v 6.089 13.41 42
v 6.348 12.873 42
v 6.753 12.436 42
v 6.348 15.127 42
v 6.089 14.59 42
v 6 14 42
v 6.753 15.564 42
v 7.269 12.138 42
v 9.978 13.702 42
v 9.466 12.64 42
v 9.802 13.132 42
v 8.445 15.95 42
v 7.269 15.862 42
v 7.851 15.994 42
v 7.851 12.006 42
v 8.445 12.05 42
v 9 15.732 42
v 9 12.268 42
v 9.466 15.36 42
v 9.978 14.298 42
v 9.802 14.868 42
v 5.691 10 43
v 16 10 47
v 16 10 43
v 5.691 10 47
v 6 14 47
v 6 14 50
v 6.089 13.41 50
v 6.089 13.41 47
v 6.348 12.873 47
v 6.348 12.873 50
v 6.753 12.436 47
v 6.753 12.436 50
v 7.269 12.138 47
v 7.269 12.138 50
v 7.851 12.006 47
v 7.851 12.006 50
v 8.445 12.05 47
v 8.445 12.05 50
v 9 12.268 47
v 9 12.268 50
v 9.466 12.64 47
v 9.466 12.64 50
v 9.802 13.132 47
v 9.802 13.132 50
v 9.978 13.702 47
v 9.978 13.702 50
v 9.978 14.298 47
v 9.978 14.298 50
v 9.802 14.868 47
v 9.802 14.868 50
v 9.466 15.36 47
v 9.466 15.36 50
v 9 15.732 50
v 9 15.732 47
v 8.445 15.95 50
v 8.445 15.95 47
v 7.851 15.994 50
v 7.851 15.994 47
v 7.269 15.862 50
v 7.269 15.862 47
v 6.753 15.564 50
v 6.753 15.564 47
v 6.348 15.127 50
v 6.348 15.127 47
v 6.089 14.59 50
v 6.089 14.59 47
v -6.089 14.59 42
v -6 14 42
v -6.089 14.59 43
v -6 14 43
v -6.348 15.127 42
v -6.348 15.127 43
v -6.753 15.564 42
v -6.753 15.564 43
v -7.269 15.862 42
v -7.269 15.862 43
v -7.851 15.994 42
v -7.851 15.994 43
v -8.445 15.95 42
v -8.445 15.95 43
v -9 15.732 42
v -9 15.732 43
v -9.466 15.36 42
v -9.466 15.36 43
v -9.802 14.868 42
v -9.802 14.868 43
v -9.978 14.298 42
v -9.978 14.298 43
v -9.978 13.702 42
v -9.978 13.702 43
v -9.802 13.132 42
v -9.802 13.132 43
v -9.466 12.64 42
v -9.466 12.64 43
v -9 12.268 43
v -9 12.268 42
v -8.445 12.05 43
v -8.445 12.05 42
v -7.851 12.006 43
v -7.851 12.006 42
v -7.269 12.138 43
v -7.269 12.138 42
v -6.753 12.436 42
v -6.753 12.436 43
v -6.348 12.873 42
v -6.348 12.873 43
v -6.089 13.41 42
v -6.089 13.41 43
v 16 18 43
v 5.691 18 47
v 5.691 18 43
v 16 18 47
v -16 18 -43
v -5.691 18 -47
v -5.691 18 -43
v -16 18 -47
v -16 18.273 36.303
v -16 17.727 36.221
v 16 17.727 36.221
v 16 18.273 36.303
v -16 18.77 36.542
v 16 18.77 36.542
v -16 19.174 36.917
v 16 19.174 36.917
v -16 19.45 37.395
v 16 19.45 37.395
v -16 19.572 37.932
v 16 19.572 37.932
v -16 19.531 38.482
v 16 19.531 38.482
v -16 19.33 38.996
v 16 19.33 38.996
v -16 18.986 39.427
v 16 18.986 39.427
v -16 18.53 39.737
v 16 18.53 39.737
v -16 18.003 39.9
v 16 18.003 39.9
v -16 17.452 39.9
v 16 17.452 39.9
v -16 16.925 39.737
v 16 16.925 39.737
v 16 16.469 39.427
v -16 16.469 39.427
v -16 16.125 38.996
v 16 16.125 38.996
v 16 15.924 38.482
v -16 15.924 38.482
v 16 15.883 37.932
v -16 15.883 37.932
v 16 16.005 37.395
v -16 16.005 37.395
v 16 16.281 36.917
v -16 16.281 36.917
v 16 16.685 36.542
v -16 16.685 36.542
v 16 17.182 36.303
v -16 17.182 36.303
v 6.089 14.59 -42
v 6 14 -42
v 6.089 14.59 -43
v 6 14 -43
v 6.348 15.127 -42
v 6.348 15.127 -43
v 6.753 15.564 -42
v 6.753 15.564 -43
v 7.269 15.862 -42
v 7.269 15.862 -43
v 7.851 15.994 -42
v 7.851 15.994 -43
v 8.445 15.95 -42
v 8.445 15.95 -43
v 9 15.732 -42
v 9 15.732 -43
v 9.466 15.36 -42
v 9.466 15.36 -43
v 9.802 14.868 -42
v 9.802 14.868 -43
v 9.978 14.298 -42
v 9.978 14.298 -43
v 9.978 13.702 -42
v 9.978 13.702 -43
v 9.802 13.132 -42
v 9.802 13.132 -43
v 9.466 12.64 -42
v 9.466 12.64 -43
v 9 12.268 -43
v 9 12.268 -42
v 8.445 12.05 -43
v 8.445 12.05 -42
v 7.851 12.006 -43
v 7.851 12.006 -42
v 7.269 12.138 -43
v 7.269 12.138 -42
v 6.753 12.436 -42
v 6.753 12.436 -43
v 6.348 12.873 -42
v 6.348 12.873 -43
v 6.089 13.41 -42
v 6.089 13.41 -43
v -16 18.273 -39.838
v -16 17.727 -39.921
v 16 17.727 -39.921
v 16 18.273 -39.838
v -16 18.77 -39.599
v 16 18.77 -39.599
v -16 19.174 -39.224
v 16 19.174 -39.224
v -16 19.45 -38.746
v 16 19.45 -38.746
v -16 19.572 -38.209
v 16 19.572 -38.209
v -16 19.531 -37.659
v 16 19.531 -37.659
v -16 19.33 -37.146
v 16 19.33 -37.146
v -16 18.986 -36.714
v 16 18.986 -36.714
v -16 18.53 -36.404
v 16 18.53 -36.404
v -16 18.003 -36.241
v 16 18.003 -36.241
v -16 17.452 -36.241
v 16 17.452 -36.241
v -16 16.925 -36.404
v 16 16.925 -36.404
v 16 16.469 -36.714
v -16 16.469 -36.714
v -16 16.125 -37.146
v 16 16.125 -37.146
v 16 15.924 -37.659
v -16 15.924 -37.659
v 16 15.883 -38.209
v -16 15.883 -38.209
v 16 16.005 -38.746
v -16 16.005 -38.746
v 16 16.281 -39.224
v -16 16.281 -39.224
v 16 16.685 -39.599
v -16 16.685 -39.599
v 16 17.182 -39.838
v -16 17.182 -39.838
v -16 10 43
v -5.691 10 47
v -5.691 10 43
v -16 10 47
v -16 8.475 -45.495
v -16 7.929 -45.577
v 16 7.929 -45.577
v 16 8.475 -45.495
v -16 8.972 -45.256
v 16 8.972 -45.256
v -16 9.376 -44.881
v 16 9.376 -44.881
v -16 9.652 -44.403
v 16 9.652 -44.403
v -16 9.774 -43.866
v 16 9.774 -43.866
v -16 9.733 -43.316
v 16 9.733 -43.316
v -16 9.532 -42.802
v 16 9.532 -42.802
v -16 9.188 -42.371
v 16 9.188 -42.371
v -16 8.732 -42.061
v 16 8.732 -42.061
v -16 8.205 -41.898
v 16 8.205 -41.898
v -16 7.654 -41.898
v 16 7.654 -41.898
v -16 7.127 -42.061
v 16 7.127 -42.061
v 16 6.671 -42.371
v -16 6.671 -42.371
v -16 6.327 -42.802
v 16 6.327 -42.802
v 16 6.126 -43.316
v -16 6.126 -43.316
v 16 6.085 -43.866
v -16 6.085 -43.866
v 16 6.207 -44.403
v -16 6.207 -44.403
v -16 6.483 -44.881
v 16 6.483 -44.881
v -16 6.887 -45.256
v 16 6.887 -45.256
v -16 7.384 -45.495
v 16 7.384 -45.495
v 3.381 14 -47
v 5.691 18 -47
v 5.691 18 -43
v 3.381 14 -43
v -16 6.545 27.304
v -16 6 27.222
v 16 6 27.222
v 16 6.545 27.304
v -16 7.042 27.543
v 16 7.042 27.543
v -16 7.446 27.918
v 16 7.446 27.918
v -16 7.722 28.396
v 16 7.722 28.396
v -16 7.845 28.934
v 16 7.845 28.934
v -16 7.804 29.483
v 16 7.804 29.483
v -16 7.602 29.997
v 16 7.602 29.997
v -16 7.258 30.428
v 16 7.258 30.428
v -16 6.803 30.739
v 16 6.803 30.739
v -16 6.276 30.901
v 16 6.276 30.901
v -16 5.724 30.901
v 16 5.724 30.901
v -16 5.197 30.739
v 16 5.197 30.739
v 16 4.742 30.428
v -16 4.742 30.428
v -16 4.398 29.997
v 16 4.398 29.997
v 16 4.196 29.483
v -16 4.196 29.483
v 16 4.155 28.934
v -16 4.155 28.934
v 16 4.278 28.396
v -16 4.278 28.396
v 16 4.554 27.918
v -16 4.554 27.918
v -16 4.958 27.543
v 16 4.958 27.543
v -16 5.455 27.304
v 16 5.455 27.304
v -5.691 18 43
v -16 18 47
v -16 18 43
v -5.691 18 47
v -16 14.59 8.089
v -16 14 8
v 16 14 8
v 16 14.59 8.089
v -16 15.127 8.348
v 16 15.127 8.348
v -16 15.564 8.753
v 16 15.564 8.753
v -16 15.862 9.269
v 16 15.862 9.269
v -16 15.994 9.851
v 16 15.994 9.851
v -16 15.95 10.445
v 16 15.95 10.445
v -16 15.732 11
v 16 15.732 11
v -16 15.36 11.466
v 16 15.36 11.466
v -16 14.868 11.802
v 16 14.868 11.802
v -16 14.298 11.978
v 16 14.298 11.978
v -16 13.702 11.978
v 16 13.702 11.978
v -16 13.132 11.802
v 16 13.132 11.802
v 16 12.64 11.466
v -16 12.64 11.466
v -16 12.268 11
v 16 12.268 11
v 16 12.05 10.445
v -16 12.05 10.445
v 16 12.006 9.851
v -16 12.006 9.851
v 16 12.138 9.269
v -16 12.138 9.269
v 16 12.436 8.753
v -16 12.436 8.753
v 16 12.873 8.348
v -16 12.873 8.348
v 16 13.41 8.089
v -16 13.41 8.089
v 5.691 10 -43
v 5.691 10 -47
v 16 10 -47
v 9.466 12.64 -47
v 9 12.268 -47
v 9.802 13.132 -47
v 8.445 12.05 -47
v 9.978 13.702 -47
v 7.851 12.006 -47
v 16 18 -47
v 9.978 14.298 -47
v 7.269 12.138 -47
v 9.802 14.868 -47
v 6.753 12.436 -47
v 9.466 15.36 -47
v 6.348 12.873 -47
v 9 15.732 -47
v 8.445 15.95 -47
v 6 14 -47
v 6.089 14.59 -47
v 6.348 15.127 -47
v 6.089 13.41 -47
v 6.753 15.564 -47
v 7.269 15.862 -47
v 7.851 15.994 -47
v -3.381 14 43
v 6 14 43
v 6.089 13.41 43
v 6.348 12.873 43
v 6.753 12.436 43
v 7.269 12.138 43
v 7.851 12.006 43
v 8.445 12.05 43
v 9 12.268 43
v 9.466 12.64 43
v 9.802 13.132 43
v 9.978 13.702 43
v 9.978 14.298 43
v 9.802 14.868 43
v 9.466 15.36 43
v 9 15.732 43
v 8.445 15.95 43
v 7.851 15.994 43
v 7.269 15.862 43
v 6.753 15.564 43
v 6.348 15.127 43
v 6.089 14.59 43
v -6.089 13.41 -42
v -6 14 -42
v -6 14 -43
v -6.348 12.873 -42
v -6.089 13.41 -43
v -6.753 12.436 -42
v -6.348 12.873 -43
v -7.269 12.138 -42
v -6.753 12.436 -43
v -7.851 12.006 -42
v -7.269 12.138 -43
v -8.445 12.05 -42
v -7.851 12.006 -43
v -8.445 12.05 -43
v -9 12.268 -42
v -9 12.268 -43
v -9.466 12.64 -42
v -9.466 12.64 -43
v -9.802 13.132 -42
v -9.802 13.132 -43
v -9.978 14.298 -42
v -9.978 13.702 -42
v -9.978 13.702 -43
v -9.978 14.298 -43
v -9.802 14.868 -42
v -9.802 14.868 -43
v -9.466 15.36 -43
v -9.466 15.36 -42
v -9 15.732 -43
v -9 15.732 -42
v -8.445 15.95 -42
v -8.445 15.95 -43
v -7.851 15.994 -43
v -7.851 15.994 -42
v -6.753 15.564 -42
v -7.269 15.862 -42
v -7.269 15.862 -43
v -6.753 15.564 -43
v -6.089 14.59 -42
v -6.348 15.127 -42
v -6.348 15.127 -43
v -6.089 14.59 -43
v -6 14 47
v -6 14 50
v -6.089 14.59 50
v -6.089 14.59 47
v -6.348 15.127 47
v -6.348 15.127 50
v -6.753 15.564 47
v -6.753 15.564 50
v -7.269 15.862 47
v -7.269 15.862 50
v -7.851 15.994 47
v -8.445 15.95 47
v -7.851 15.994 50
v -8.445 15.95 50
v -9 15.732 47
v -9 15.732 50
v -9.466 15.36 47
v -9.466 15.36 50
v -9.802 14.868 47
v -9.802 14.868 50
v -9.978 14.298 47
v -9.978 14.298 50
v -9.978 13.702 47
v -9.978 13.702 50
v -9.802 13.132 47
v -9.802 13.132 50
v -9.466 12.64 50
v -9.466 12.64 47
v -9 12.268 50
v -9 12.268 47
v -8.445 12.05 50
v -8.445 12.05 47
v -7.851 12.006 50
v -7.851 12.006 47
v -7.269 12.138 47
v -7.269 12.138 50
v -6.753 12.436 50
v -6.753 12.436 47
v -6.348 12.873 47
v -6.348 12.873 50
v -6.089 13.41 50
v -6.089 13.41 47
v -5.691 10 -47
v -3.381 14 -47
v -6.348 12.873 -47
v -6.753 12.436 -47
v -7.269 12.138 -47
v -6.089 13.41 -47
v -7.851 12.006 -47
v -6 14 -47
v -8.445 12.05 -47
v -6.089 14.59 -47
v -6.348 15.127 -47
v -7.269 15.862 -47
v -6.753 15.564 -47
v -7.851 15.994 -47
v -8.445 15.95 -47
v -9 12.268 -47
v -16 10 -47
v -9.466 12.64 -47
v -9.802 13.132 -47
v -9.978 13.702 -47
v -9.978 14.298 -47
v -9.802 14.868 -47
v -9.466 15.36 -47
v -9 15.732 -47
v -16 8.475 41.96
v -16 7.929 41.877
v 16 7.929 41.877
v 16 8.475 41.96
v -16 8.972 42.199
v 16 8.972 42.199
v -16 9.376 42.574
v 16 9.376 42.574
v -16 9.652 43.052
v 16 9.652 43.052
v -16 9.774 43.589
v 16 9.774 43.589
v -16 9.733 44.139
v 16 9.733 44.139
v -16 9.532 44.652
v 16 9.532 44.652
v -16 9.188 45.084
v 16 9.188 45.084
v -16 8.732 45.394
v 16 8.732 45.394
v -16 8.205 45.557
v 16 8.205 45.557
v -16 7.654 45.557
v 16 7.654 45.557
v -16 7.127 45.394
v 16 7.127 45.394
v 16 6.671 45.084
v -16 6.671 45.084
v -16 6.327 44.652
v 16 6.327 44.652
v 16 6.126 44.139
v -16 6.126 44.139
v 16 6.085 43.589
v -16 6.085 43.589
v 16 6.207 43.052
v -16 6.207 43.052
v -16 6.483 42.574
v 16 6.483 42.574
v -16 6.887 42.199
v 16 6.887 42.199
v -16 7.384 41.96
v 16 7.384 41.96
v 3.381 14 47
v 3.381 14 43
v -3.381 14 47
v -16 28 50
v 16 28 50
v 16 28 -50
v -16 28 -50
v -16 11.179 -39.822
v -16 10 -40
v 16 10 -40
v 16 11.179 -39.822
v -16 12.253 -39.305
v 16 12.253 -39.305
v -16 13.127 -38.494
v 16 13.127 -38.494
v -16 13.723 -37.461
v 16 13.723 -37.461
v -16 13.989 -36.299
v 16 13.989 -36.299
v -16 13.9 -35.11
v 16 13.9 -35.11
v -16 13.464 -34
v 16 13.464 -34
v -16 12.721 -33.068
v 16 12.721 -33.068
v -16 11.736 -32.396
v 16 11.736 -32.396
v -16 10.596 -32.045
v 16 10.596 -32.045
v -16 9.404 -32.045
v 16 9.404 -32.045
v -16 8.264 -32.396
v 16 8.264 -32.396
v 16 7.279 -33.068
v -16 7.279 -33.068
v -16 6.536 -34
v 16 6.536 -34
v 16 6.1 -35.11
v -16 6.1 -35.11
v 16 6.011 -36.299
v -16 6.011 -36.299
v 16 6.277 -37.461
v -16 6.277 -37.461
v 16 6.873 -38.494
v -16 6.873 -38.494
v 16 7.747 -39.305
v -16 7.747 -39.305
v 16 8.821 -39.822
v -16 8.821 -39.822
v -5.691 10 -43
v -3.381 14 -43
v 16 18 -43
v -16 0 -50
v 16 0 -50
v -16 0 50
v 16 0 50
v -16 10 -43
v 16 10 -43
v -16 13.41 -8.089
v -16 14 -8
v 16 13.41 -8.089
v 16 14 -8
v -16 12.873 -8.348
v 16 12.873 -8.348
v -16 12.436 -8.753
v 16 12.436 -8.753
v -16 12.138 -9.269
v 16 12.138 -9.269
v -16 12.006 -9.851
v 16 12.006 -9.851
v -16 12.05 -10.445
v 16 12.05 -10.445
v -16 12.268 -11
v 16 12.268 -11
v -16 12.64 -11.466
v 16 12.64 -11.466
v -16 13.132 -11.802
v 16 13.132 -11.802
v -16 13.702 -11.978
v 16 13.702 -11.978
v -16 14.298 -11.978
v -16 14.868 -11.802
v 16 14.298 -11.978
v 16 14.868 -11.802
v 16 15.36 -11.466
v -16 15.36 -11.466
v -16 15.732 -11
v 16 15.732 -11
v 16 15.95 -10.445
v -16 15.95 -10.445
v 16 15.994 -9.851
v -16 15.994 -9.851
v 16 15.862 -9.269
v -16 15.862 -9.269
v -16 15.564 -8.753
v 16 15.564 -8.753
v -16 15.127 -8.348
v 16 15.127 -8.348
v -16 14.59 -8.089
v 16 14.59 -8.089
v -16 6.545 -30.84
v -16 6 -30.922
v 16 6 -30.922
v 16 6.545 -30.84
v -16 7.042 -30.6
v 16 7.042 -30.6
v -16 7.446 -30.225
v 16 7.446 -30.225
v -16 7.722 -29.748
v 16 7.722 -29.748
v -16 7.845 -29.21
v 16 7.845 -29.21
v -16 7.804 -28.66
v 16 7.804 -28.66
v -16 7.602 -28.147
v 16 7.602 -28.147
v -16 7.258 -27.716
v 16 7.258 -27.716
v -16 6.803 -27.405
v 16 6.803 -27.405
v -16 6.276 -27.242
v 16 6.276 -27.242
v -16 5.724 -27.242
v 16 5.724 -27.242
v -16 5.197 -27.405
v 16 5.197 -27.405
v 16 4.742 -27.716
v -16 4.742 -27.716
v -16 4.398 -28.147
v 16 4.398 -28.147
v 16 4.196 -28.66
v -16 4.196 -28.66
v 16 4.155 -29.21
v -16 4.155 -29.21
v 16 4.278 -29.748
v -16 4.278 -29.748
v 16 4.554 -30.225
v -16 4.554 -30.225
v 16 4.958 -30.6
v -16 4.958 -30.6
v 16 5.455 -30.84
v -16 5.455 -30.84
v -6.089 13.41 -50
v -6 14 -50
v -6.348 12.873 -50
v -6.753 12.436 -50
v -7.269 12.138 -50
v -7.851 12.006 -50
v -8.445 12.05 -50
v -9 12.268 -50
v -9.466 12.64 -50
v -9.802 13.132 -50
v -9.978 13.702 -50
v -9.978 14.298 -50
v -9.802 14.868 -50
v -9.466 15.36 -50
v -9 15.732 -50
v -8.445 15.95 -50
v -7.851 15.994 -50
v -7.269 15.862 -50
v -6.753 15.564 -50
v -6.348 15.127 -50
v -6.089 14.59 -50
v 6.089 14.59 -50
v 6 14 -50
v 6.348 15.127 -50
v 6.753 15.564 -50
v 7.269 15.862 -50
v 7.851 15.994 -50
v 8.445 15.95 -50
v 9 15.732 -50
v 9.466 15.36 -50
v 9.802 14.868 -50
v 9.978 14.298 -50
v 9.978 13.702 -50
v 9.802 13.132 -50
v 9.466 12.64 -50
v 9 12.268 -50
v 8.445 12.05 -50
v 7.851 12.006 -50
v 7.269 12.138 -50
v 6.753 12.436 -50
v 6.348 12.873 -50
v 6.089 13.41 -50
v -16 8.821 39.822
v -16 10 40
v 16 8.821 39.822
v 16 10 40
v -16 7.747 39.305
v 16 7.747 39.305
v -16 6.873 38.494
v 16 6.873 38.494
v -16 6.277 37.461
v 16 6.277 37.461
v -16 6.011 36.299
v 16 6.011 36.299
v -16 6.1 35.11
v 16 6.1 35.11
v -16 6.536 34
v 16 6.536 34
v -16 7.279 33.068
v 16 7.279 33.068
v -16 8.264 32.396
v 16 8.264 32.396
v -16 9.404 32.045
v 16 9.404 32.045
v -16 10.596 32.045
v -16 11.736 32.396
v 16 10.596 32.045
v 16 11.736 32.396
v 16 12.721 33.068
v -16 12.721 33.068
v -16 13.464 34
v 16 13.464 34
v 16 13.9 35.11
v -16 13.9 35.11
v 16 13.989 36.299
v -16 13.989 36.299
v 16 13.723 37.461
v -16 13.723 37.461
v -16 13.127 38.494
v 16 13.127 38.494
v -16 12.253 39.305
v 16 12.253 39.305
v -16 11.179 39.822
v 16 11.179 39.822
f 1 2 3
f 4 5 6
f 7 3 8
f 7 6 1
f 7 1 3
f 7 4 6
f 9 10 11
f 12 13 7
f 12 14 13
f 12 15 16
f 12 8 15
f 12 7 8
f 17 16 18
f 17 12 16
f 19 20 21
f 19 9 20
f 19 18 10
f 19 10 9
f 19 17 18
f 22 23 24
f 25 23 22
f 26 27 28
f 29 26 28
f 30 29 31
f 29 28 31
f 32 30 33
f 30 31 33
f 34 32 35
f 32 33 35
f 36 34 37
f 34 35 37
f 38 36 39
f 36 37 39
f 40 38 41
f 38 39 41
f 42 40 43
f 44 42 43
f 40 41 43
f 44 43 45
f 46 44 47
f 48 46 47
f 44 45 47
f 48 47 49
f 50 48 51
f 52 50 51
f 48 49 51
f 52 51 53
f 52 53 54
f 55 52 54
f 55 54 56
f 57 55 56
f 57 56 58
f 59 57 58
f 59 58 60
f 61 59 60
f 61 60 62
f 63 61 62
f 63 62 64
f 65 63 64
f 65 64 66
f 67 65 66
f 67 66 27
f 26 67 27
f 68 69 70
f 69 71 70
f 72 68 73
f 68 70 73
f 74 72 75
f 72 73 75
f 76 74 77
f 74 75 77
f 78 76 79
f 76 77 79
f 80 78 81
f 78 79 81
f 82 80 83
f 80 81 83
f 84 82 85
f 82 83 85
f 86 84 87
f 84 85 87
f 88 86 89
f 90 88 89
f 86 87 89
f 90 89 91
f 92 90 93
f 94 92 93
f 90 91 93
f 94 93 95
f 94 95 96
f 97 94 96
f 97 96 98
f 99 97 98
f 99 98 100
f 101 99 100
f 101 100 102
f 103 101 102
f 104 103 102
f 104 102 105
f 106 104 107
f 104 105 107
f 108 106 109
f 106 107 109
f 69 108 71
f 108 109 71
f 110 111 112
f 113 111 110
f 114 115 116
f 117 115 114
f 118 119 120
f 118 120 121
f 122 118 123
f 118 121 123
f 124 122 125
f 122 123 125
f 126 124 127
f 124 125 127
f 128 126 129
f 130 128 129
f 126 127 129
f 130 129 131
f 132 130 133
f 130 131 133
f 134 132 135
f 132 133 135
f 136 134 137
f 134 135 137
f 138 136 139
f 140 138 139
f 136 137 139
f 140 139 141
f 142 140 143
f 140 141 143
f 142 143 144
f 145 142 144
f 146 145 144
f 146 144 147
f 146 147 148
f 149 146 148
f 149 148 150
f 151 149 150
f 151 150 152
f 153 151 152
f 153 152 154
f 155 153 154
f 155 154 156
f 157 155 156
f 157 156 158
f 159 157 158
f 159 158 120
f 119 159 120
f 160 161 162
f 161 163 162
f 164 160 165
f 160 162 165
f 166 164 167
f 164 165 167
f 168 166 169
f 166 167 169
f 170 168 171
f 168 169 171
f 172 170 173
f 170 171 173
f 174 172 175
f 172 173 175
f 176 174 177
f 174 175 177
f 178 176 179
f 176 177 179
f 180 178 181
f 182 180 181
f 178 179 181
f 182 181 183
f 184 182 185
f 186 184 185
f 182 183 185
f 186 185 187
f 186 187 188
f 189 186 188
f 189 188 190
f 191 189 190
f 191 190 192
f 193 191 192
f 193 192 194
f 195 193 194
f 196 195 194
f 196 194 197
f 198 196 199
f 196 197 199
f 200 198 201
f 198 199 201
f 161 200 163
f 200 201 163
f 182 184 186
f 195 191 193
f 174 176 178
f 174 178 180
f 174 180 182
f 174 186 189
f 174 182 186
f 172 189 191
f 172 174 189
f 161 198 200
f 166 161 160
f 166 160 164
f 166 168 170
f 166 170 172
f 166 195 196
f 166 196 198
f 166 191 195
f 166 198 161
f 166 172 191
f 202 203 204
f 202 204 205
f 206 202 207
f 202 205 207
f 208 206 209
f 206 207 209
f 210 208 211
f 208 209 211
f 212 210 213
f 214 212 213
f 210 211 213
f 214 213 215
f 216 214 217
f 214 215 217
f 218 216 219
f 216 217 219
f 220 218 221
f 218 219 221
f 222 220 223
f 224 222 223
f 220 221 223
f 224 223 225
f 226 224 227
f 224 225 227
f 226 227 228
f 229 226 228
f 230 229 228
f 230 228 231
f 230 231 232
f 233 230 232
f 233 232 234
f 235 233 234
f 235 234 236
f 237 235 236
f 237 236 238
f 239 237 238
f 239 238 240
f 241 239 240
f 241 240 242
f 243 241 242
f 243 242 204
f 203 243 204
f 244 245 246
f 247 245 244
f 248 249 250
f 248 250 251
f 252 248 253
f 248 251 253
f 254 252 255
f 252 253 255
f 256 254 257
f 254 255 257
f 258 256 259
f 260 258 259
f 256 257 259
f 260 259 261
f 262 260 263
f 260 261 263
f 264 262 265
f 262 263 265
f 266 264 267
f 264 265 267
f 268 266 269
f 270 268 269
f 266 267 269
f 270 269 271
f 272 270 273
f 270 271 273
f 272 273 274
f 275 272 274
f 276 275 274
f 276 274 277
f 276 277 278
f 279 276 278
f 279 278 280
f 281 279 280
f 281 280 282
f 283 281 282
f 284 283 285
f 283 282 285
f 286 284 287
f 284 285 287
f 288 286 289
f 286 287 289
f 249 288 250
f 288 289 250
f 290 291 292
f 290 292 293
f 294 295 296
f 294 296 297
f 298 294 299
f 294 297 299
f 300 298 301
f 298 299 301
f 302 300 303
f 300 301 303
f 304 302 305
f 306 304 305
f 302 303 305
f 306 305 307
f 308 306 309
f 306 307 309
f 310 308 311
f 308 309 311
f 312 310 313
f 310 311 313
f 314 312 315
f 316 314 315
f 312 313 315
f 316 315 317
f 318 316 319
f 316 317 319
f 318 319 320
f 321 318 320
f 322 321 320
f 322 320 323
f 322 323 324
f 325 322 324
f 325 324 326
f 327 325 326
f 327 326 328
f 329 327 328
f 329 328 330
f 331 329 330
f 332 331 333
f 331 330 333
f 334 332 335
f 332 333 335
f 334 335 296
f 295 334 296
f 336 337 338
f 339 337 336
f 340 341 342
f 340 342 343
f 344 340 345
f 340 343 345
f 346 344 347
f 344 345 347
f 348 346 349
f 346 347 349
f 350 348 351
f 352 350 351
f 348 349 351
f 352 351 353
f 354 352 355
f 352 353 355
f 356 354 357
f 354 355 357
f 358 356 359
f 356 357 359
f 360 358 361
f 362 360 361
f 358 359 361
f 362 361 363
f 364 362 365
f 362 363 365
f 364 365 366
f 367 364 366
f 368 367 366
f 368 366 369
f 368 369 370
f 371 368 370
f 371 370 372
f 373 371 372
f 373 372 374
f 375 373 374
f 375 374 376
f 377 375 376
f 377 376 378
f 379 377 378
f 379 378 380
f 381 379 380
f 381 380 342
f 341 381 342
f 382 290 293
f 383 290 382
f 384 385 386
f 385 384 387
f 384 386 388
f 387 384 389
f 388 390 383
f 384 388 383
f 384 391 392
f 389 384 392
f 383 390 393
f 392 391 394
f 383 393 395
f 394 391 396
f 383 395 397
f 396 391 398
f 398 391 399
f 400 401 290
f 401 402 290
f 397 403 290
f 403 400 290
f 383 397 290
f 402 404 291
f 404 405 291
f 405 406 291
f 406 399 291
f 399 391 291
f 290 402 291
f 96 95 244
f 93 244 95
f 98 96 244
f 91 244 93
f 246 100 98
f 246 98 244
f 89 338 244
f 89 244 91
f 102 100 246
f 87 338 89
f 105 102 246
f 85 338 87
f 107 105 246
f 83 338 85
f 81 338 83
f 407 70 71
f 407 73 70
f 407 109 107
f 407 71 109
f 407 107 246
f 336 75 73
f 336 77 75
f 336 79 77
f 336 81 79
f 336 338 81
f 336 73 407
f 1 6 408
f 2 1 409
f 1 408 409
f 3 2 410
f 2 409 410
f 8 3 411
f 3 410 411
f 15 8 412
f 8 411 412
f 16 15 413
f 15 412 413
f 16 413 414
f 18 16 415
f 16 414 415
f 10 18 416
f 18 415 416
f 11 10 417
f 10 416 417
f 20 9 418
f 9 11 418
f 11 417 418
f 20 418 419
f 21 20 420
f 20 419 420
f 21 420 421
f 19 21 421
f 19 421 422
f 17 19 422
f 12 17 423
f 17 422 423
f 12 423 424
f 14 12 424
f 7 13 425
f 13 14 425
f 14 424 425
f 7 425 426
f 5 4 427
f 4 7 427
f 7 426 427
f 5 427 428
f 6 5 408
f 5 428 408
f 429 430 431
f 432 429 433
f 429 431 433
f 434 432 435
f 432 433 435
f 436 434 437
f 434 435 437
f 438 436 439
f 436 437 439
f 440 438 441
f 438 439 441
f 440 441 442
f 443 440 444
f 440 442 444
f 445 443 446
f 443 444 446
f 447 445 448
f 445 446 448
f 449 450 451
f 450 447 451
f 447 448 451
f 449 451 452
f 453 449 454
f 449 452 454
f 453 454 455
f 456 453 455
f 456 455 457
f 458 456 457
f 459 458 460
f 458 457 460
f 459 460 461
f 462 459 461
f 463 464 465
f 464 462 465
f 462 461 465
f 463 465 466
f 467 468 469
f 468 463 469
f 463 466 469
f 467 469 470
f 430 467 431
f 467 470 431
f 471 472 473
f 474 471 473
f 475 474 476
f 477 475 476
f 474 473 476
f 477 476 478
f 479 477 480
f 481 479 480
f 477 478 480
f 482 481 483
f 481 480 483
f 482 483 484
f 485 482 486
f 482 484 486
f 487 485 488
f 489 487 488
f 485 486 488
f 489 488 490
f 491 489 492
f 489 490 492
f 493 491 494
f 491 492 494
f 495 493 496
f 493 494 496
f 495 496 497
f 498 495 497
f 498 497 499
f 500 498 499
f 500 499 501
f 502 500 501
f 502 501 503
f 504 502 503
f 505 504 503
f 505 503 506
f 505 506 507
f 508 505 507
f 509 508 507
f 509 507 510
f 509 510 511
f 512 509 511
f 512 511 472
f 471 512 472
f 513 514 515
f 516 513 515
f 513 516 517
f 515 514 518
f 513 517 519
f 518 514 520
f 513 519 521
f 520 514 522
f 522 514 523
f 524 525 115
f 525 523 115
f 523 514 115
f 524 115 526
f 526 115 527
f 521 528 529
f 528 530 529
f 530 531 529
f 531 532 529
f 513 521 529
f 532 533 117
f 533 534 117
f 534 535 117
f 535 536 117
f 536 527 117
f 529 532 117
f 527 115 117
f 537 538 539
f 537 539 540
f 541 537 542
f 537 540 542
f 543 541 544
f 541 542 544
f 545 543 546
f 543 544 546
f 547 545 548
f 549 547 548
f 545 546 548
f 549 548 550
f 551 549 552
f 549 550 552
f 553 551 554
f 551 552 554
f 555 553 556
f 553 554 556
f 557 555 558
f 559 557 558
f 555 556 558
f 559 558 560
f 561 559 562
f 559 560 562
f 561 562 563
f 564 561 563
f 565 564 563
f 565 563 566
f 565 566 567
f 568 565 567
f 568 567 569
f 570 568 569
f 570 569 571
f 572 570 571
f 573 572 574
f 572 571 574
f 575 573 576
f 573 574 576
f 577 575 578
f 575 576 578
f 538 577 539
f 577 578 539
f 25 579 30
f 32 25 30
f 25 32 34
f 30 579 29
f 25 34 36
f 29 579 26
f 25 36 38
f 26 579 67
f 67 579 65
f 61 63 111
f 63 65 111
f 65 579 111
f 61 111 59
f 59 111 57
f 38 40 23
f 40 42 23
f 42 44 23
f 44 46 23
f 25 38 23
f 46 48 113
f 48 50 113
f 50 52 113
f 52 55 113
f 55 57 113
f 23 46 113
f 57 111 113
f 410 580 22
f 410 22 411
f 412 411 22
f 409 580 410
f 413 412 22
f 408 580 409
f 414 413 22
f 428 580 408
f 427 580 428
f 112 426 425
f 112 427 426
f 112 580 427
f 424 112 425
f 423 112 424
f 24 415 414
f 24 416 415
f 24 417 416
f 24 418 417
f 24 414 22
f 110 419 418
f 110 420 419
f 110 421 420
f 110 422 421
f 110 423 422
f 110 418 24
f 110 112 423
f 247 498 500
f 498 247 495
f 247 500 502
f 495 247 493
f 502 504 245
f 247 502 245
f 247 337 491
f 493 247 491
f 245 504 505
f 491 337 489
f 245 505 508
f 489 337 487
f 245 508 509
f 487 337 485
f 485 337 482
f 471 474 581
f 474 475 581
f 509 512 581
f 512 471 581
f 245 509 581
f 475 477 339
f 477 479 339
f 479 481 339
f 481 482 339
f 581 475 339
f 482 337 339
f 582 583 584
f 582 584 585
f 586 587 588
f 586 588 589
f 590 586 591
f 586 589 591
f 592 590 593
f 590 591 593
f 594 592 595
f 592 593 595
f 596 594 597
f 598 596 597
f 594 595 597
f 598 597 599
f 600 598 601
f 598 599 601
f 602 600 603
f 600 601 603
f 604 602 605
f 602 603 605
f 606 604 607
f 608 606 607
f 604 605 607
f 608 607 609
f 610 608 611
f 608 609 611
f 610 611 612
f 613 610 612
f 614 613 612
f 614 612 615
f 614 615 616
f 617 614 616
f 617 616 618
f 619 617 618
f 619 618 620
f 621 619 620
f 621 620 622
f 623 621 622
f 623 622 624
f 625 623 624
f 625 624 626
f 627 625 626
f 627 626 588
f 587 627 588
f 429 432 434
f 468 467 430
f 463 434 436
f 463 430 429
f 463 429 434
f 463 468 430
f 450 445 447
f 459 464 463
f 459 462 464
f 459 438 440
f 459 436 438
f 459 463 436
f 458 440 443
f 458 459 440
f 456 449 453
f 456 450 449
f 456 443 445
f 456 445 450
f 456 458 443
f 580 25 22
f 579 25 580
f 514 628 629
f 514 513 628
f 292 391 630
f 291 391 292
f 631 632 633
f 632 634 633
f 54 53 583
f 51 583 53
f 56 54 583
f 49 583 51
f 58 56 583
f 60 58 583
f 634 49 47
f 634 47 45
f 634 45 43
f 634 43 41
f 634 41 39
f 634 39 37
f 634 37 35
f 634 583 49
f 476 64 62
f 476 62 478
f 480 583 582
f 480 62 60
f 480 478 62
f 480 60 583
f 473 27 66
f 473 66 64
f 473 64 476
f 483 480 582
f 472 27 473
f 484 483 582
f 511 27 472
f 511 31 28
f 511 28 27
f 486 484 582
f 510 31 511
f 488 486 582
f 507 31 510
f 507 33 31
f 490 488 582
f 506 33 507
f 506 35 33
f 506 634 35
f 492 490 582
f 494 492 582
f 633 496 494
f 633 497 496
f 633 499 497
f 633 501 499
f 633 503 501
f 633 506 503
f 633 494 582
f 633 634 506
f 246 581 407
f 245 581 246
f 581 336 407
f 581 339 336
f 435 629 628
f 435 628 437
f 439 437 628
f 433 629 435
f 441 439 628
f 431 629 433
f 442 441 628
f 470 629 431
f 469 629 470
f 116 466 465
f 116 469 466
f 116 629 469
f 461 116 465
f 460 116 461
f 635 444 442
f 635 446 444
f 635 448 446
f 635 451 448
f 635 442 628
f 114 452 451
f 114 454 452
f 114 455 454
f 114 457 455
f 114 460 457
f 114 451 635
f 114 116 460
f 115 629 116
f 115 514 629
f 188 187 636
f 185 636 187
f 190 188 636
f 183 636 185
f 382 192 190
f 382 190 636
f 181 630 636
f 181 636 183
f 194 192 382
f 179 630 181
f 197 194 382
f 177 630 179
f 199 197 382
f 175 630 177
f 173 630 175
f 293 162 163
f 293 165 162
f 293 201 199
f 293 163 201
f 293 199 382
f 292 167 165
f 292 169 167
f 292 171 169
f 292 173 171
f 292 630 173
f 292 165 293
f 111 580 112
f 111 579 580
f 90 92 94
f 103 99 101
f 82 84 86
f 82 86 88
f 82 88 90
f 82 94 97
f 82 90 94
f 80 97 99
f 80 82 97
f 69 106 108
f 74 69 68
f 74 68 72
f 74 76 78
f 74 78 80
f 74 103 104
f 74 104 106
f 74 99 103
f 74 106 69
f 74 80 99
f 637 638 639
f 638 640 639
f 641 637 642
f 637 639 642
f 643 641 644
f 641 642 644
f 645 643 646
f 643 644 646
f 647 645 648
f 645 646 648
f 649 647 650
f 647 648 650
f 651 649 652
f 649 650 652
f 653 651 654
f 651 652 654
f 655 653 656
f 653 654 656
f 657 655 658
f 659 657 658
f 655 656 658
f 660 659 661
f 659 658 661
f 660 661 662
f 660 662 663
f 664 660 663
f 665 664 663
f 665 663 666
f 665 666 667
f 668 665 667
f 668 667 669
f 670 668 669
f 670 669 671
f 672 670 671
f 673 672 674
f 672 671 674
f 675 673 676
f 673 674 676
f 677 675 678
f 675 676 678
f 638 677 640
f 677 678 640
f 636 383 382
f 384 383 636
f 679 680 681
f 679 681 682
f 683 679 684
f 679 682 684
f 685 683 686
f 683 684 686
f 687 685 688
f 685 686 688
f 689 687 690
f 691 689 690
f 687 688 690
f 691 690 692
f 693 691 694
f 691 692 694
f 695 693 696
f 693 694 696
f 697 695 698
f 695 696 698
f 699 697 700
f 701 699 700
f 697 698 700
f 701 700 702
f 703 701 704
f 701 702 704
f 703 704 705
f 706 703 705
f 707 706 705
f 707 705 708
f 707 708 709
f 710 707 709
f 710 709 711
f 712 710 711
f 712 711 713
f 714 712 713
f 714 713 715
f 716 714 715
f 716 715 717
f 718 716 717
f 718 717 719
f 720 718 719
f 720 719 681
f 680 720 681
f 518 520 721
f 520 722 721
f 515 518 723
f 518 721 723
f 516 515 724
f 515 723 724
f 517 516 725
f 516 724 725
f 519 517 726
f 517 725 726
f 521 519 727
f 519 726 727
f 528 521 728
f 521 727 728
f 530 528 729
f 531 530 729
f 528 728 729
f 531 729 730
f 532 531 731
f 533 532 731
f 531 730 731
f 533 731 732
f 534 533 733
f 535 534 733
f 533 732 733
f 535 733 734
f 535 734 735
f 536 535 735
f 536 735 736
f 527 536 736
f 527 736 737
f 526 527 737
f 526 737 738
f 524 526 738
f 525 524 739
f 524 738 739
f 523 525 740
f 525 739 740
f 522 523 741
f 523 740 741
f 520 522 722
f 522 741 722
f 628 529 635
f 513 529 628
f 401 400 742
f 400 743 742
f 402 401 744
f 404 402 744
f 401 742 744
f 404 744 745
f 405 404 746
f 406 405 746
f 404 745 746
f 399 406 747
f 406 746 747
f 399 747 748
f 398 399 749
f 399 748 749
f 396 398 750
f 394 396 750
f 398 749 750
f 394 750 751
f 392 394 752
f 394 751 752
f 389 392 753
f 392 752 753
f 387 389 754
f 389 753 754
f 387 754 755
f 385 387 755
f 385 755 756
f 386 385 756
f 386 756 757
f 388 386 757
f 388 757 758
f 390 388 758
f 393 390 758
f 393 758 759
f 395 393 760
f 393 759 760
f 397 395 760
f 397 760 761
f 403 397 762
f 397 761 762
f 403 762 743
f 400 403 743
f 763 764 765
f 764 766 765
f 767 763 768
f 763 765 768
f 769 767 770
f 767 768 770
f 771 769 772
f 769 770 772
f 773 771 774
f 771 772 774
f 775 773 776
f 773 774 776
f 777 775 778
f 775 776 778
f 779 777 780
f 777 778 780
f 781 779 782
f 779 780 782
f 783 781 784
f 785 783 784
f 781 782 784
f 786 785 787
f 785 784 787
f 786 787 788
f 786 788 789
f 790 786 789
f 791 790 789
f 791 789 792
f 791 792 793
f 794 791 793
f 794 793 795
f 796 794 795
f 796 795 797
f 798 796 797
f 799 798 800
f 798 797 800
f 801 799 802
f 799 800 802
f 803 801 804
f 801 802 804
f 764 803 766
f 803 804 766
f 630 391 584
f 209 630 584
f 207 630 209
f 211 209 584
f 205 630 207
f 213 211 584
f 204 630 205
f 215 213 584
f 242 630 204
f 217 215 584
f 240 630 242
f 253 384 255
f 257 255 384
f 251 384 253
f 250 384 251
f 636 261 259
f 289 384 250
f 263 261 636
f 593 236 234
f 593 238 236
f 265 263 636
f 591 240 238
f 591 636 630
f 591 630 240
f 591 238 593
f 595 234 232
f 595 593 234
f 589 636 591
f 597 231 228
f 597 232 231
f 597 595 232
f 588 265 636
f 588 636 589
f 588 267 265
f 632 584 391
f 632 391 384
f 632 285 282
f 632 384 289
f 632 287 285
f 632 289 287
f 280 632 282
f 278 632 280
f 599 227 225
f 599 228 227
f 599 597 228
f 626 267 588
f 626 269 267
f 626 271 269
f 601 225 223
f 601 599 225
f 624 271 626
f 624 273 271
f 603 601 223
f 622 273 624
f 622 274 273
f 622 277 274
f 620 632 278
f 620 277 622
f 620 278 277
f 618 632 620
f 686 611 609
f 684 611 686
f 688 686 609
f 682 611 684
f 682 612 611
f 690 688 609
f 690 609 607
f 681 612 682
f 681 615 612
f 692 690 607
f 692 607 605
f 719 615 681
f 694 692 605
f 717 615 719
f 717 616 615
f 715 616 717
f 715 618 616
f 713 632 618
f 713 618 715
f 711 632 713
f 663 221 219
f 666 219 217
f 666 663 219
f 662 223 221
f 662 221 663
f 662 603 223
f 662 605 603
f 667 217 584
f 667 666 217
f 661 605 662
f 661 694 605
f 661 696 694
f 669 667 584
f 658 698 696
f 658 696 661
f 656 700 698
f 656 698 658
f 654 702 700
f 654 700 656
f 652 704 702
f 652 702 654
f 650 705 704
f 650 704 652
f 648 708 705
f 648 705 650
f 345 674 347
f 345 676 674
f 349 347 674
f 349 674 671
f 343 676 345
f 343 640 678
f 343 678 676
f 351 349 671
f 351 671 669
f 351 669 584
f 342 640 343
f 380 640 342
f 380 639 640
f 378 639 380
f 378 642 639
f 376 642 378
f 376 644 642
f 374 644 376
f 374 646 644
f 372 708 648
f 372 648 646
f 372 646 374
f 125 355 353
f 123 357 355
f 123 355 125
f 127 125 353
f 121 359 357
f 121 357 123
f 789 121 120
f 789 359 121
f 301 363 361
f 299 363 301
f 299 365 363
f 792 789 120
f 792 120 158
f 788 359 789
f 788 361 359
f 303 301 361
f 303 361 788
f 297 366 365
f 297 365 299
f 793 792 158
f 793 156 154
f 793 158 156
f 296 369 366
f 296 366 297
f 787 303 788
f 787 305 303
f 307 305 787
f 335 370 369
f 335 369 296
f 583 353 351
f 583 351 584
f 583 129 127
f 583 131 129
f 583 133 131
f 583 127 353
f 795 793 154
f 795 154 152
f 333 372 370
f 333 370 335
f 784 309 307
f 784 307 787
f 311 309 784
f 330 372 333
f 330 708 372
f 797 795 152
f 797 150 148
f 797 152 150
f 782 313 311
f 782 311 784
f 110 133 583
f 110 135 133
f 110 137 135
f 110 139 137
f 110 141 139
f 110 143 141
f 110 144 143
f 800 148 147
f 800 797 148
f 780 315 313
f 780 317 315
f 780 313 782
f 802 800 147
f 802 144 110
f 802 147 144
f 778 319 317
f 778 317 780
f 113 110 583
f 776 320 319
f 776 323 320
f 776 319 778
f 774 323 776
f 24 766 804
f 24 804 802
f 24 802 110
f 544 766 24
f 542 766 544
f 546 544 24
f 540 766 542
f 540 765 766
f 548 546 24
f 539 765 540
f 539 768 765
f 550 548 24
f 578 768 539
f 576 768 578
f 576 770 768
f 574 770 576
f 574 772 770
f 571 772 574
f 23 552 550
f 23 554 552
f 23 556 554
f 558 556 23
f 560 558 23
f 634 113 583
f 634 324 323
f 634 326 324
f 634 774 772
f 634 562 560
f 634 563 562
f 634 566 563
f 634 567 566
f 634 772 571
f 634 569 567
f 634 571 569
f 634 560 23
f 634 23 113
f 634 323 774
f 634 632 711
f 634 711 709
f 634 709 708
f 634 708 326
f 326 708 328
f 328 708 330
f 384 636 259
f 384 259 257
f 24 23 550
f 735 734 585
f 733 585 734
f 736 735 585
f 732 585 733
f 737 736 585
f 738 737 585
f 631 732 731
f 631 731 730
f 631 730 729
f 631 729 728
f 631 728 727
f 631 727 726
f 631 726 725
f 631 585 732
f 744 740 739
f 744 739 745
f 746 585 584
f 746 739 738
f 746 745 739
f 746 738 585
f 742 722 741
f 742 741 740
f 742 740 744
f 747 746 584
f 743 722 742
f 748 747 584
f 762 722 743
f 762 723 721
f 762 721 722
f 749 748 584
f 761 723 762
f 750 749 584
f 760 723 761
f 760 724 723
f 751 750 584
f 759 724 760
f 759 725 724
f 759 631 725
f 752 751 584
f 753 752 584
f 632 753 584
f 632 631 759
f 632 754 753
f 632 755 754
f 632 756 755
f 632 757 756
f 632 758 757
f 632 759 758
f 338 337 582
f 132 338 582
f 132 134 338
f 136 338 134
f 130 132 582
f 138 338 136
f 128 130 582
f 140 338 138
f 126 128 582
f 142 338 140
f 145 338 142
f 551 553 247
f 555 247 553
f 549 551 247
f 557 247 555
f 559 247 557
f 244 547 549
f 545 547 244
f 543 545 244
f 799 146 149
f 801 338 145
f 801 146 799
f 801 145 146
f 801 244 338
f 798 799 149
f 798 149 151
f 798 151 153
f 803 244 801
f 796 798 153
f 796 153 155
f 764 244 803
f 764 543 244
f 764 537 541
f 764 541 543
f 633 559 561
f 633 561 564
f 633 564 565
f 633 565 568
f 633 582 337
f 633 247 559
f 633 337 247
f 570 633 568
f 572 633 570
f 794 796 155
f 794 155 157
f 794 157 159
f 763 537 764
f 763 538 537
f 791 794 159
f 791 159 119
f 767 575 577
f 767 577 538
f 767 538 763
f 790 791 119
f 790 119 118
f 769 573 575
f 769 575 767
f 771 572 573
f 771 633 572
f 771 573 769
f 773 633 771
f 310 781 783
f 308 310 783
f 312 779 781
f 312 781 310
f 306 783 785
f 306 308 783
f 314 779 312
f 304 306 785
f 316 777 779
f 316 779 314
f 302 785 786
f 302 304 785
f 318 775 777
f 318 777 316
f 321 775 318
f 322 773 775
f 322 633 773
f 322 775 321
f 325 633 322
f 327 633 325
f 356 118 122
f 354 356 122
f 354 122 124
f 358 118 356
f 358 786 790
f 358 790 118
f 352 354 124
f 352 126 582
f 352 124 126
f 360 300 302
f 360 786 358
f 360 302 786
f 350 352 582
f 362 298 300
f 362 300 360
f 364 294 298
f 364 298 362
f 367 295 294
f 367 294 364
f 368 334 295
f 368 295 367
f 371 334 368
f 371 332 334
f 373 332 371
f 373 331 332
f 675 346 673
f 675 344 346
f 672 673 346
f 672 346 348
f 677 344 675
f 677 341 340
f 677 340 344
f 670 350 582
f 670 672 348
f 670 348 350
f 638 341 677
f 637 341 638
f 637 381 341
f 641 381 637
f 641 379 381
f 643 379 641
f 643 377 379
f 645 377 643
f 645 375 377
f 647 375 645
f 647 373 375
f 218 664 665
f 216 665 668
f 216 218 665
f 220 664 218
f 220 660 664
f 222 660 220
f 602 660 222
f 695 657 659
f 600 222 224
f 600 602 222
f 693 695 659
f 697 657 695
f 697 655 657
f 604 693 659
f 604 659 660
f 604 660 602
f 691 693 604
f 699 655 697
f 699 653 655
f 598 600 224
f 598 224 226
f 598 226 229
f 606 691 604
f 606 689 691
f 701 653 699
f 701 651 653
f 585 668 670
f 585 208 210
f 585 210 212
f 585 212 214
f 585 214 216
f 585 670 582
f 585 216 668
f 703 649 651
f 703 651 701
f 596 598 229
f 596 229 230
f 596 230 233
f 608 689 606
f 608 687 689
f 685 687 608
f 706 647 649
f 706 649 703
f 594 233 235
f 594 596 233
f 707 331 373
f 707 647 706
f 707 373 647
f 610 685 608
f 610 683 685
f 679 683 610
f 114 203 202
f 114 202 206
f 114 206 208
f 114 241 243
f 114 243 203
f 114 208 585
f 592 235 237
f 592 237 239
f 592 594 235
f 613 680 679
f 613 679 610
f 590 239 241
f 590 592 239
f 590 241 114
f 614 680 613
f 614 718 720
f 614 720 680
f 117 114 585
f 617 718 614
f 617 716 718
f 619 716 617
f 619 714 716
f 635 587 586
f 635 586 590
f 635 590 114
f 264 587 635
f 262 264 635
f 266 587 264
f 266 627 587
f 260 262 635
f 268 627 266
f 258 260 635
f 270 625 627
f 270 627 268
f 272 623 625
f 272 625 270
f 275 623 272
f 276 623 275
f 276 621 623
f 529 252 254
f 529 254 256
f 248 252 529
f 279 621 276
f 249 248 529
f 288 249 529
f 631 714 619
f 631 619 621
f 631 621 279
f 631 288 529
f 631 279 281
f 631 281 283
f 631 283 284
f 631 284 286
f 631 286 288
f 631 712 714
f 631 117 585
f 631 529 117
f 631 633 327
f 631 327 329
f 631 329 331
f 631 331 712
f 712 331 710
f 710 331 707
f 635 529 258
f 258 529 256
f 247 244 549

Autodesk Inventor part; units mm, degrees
ref_plane "YZ Plane" through (0, 0, 0) normal (1, 0, 0) x (0, 1, 0)
ref_plane "XZ Plane" through (0, 0, 0) normal (0, 1, 0) x (-1, 0, 0)
sketch "Эскиз1" plane through (0, 0, 0) normal (0, 1, 0) x (-1, 0, 0)
  line L0 (-16, 50) -> (16, 50)
  line L1 (16, 50) -> (16, -50)
  line L2 (16, -50) -> (-16, -50)
  line L3 (-16, -50) -> (-16, 50)
  line L4 (-16, 50) -> (16, -50) construction
  line L5 (16, 50) -> (-16, -50) construction
  point P0 (0, 0)
  dimension "d0" = 32
  dimension "d1" = 100
extrude "Выдавливание1" add sketch "Эскиз1" along normal blind 28
sketch "Эскиз2" plane through (16, 0, 50) normal (1, 0, 0) x (0, 0, -1)
  circle A0 centre (86, 10) radius 4
  line L0 (100, 0) -> (100, 28) projected
  line L1 (0, 0) -> (100, 0) projected
  point P0 (50, 0)
  dimension "d4" = 8
  dimension "d5" = 14
  dimension "d6" = 10
extrude "Выдавливание2" cut sketch "Эскиз2" against normal through all
mirror "Зеркальное отражение1" about plane through (0, 0, 0) normal (0, 0, 1) of "Выдавливание2"
sketch "Эскиз3" plane through (16, 0, 50) normal (1, 0, 0) x (0, 0, -1)
  circle A0 centre (11.9294, 17.7274) radius 1.85 projected
  circle A1 centre (20.9282, 6) radius 1.85 projected
  circle A2 centre (79.0718, 6) radius 1.85 projected
  circle A3 centre (88.0706, 17.7274) radius 1.85 projected
  circle A4 centre (93.7274, 7.9294) radius 1.85 projected
  circle A5 centre (6.2726, 7.9294) radius 1.85 projected
  point P0 (50, 0)
extrude "Выдавливание3" cut sketch "Эскиз3" against normal through all
sketch "Эскиз4" plane through (16, 0, 50) normal (1, 0, 0) x (0, 0, -1)
  line L0 (50, 0) -> (50, 14) construction
  line L1 (50, 14) -> (40, 14) construction
  circle A0 centre (40, 14) radius 2
  dimension "d11" = 10
  dimension "d12" = 14
  dimension "d13" = 4
extrude "Выдавливание4" cut sketch "Эскиз4" against normal through all
mirror "Зеркальное отражение2" about plane through (0, 0, 0) normal (0, 0, 1) of "Выдавливание4"
sketch "Эскиз5" plane through (-16, 0, 50) normal (0, 0, 1) x (1, 0, 0)
  circle A0 centre (8, 14) radius 2
  line L0 (0, 0) -> (32, 0) projected
  line L1 (0, 0) -> (0, 28) projected
  point P0 (16, 0)
  dimension "d16" = 4
  dimension "d17" = 14
  dimension "d18" = 8
extrude "Выдавливание5" cut sketch "Эскиз5" against normal blind 8
ref_plane "РабПлоскость1" through (-16, 0, 47) normal (0, 0, 1) x (1, 0, 0)
sketch "Эскиз6" plane through (-16, 0, 47) normal (0, 0, 1) x (1, 0, 0)
  circle A0 centre (8, 14) radius 2 projected
  line L0 (10.3094, 10) -> (5.6906, 10)
  line L1 (5.6906, 10) -> (3.3812, 14)
  line L2 (3.3812, 14) -> (5.6906, 18)
  line L3 (5.6906, 18) -> (10.3094, 18)
  line L4 (10.3094, 18) -> (12.6188, 14)
  line L5 (12.6188, 14) -> (10.3094, 10)
  line L6 (32, 0) -> (0, 0) projected
  line L7 (5.6906, 18) -> (0, 18)
  line L8 (32, 19.5774) -> (0, 19.5774) projected
  line L9 (5.6906, 10) -> (0, 10)
  line L10 (0, 6) -> (0, 14) projected
  line L11 (0, 18) -> (0, 10)
  point P0 (16, 0)
  point P1 (0, 14)
  dimension "d22" = 8
extrude "Выдавливание6" cut sketch "Эскиз6" against normal blind 4 contours A0 | L0 L1 L2 L3 L4 L5 | L9 L10 L11 L7 L2 L1
ref_plane "РабПлоскость2" through (0, 28, 50) normal (-1, 0, 0) x (0, 0, 1)
mirror "Зеркальное отражение3" about plane through (0, 28, 50) normal (-1, 0, 0) of "Выдавливание6", "Выдавливание5"
mirror "Зеркальное отражение4" about plane through (0, 0, 0) normal (0, 0, 1) of "Выдавливание6", "Выдавливание5", "Зеркальное отражение3"
properties part number "KB33-046-003-001 - Соединитель" material "Пластик АБС"
